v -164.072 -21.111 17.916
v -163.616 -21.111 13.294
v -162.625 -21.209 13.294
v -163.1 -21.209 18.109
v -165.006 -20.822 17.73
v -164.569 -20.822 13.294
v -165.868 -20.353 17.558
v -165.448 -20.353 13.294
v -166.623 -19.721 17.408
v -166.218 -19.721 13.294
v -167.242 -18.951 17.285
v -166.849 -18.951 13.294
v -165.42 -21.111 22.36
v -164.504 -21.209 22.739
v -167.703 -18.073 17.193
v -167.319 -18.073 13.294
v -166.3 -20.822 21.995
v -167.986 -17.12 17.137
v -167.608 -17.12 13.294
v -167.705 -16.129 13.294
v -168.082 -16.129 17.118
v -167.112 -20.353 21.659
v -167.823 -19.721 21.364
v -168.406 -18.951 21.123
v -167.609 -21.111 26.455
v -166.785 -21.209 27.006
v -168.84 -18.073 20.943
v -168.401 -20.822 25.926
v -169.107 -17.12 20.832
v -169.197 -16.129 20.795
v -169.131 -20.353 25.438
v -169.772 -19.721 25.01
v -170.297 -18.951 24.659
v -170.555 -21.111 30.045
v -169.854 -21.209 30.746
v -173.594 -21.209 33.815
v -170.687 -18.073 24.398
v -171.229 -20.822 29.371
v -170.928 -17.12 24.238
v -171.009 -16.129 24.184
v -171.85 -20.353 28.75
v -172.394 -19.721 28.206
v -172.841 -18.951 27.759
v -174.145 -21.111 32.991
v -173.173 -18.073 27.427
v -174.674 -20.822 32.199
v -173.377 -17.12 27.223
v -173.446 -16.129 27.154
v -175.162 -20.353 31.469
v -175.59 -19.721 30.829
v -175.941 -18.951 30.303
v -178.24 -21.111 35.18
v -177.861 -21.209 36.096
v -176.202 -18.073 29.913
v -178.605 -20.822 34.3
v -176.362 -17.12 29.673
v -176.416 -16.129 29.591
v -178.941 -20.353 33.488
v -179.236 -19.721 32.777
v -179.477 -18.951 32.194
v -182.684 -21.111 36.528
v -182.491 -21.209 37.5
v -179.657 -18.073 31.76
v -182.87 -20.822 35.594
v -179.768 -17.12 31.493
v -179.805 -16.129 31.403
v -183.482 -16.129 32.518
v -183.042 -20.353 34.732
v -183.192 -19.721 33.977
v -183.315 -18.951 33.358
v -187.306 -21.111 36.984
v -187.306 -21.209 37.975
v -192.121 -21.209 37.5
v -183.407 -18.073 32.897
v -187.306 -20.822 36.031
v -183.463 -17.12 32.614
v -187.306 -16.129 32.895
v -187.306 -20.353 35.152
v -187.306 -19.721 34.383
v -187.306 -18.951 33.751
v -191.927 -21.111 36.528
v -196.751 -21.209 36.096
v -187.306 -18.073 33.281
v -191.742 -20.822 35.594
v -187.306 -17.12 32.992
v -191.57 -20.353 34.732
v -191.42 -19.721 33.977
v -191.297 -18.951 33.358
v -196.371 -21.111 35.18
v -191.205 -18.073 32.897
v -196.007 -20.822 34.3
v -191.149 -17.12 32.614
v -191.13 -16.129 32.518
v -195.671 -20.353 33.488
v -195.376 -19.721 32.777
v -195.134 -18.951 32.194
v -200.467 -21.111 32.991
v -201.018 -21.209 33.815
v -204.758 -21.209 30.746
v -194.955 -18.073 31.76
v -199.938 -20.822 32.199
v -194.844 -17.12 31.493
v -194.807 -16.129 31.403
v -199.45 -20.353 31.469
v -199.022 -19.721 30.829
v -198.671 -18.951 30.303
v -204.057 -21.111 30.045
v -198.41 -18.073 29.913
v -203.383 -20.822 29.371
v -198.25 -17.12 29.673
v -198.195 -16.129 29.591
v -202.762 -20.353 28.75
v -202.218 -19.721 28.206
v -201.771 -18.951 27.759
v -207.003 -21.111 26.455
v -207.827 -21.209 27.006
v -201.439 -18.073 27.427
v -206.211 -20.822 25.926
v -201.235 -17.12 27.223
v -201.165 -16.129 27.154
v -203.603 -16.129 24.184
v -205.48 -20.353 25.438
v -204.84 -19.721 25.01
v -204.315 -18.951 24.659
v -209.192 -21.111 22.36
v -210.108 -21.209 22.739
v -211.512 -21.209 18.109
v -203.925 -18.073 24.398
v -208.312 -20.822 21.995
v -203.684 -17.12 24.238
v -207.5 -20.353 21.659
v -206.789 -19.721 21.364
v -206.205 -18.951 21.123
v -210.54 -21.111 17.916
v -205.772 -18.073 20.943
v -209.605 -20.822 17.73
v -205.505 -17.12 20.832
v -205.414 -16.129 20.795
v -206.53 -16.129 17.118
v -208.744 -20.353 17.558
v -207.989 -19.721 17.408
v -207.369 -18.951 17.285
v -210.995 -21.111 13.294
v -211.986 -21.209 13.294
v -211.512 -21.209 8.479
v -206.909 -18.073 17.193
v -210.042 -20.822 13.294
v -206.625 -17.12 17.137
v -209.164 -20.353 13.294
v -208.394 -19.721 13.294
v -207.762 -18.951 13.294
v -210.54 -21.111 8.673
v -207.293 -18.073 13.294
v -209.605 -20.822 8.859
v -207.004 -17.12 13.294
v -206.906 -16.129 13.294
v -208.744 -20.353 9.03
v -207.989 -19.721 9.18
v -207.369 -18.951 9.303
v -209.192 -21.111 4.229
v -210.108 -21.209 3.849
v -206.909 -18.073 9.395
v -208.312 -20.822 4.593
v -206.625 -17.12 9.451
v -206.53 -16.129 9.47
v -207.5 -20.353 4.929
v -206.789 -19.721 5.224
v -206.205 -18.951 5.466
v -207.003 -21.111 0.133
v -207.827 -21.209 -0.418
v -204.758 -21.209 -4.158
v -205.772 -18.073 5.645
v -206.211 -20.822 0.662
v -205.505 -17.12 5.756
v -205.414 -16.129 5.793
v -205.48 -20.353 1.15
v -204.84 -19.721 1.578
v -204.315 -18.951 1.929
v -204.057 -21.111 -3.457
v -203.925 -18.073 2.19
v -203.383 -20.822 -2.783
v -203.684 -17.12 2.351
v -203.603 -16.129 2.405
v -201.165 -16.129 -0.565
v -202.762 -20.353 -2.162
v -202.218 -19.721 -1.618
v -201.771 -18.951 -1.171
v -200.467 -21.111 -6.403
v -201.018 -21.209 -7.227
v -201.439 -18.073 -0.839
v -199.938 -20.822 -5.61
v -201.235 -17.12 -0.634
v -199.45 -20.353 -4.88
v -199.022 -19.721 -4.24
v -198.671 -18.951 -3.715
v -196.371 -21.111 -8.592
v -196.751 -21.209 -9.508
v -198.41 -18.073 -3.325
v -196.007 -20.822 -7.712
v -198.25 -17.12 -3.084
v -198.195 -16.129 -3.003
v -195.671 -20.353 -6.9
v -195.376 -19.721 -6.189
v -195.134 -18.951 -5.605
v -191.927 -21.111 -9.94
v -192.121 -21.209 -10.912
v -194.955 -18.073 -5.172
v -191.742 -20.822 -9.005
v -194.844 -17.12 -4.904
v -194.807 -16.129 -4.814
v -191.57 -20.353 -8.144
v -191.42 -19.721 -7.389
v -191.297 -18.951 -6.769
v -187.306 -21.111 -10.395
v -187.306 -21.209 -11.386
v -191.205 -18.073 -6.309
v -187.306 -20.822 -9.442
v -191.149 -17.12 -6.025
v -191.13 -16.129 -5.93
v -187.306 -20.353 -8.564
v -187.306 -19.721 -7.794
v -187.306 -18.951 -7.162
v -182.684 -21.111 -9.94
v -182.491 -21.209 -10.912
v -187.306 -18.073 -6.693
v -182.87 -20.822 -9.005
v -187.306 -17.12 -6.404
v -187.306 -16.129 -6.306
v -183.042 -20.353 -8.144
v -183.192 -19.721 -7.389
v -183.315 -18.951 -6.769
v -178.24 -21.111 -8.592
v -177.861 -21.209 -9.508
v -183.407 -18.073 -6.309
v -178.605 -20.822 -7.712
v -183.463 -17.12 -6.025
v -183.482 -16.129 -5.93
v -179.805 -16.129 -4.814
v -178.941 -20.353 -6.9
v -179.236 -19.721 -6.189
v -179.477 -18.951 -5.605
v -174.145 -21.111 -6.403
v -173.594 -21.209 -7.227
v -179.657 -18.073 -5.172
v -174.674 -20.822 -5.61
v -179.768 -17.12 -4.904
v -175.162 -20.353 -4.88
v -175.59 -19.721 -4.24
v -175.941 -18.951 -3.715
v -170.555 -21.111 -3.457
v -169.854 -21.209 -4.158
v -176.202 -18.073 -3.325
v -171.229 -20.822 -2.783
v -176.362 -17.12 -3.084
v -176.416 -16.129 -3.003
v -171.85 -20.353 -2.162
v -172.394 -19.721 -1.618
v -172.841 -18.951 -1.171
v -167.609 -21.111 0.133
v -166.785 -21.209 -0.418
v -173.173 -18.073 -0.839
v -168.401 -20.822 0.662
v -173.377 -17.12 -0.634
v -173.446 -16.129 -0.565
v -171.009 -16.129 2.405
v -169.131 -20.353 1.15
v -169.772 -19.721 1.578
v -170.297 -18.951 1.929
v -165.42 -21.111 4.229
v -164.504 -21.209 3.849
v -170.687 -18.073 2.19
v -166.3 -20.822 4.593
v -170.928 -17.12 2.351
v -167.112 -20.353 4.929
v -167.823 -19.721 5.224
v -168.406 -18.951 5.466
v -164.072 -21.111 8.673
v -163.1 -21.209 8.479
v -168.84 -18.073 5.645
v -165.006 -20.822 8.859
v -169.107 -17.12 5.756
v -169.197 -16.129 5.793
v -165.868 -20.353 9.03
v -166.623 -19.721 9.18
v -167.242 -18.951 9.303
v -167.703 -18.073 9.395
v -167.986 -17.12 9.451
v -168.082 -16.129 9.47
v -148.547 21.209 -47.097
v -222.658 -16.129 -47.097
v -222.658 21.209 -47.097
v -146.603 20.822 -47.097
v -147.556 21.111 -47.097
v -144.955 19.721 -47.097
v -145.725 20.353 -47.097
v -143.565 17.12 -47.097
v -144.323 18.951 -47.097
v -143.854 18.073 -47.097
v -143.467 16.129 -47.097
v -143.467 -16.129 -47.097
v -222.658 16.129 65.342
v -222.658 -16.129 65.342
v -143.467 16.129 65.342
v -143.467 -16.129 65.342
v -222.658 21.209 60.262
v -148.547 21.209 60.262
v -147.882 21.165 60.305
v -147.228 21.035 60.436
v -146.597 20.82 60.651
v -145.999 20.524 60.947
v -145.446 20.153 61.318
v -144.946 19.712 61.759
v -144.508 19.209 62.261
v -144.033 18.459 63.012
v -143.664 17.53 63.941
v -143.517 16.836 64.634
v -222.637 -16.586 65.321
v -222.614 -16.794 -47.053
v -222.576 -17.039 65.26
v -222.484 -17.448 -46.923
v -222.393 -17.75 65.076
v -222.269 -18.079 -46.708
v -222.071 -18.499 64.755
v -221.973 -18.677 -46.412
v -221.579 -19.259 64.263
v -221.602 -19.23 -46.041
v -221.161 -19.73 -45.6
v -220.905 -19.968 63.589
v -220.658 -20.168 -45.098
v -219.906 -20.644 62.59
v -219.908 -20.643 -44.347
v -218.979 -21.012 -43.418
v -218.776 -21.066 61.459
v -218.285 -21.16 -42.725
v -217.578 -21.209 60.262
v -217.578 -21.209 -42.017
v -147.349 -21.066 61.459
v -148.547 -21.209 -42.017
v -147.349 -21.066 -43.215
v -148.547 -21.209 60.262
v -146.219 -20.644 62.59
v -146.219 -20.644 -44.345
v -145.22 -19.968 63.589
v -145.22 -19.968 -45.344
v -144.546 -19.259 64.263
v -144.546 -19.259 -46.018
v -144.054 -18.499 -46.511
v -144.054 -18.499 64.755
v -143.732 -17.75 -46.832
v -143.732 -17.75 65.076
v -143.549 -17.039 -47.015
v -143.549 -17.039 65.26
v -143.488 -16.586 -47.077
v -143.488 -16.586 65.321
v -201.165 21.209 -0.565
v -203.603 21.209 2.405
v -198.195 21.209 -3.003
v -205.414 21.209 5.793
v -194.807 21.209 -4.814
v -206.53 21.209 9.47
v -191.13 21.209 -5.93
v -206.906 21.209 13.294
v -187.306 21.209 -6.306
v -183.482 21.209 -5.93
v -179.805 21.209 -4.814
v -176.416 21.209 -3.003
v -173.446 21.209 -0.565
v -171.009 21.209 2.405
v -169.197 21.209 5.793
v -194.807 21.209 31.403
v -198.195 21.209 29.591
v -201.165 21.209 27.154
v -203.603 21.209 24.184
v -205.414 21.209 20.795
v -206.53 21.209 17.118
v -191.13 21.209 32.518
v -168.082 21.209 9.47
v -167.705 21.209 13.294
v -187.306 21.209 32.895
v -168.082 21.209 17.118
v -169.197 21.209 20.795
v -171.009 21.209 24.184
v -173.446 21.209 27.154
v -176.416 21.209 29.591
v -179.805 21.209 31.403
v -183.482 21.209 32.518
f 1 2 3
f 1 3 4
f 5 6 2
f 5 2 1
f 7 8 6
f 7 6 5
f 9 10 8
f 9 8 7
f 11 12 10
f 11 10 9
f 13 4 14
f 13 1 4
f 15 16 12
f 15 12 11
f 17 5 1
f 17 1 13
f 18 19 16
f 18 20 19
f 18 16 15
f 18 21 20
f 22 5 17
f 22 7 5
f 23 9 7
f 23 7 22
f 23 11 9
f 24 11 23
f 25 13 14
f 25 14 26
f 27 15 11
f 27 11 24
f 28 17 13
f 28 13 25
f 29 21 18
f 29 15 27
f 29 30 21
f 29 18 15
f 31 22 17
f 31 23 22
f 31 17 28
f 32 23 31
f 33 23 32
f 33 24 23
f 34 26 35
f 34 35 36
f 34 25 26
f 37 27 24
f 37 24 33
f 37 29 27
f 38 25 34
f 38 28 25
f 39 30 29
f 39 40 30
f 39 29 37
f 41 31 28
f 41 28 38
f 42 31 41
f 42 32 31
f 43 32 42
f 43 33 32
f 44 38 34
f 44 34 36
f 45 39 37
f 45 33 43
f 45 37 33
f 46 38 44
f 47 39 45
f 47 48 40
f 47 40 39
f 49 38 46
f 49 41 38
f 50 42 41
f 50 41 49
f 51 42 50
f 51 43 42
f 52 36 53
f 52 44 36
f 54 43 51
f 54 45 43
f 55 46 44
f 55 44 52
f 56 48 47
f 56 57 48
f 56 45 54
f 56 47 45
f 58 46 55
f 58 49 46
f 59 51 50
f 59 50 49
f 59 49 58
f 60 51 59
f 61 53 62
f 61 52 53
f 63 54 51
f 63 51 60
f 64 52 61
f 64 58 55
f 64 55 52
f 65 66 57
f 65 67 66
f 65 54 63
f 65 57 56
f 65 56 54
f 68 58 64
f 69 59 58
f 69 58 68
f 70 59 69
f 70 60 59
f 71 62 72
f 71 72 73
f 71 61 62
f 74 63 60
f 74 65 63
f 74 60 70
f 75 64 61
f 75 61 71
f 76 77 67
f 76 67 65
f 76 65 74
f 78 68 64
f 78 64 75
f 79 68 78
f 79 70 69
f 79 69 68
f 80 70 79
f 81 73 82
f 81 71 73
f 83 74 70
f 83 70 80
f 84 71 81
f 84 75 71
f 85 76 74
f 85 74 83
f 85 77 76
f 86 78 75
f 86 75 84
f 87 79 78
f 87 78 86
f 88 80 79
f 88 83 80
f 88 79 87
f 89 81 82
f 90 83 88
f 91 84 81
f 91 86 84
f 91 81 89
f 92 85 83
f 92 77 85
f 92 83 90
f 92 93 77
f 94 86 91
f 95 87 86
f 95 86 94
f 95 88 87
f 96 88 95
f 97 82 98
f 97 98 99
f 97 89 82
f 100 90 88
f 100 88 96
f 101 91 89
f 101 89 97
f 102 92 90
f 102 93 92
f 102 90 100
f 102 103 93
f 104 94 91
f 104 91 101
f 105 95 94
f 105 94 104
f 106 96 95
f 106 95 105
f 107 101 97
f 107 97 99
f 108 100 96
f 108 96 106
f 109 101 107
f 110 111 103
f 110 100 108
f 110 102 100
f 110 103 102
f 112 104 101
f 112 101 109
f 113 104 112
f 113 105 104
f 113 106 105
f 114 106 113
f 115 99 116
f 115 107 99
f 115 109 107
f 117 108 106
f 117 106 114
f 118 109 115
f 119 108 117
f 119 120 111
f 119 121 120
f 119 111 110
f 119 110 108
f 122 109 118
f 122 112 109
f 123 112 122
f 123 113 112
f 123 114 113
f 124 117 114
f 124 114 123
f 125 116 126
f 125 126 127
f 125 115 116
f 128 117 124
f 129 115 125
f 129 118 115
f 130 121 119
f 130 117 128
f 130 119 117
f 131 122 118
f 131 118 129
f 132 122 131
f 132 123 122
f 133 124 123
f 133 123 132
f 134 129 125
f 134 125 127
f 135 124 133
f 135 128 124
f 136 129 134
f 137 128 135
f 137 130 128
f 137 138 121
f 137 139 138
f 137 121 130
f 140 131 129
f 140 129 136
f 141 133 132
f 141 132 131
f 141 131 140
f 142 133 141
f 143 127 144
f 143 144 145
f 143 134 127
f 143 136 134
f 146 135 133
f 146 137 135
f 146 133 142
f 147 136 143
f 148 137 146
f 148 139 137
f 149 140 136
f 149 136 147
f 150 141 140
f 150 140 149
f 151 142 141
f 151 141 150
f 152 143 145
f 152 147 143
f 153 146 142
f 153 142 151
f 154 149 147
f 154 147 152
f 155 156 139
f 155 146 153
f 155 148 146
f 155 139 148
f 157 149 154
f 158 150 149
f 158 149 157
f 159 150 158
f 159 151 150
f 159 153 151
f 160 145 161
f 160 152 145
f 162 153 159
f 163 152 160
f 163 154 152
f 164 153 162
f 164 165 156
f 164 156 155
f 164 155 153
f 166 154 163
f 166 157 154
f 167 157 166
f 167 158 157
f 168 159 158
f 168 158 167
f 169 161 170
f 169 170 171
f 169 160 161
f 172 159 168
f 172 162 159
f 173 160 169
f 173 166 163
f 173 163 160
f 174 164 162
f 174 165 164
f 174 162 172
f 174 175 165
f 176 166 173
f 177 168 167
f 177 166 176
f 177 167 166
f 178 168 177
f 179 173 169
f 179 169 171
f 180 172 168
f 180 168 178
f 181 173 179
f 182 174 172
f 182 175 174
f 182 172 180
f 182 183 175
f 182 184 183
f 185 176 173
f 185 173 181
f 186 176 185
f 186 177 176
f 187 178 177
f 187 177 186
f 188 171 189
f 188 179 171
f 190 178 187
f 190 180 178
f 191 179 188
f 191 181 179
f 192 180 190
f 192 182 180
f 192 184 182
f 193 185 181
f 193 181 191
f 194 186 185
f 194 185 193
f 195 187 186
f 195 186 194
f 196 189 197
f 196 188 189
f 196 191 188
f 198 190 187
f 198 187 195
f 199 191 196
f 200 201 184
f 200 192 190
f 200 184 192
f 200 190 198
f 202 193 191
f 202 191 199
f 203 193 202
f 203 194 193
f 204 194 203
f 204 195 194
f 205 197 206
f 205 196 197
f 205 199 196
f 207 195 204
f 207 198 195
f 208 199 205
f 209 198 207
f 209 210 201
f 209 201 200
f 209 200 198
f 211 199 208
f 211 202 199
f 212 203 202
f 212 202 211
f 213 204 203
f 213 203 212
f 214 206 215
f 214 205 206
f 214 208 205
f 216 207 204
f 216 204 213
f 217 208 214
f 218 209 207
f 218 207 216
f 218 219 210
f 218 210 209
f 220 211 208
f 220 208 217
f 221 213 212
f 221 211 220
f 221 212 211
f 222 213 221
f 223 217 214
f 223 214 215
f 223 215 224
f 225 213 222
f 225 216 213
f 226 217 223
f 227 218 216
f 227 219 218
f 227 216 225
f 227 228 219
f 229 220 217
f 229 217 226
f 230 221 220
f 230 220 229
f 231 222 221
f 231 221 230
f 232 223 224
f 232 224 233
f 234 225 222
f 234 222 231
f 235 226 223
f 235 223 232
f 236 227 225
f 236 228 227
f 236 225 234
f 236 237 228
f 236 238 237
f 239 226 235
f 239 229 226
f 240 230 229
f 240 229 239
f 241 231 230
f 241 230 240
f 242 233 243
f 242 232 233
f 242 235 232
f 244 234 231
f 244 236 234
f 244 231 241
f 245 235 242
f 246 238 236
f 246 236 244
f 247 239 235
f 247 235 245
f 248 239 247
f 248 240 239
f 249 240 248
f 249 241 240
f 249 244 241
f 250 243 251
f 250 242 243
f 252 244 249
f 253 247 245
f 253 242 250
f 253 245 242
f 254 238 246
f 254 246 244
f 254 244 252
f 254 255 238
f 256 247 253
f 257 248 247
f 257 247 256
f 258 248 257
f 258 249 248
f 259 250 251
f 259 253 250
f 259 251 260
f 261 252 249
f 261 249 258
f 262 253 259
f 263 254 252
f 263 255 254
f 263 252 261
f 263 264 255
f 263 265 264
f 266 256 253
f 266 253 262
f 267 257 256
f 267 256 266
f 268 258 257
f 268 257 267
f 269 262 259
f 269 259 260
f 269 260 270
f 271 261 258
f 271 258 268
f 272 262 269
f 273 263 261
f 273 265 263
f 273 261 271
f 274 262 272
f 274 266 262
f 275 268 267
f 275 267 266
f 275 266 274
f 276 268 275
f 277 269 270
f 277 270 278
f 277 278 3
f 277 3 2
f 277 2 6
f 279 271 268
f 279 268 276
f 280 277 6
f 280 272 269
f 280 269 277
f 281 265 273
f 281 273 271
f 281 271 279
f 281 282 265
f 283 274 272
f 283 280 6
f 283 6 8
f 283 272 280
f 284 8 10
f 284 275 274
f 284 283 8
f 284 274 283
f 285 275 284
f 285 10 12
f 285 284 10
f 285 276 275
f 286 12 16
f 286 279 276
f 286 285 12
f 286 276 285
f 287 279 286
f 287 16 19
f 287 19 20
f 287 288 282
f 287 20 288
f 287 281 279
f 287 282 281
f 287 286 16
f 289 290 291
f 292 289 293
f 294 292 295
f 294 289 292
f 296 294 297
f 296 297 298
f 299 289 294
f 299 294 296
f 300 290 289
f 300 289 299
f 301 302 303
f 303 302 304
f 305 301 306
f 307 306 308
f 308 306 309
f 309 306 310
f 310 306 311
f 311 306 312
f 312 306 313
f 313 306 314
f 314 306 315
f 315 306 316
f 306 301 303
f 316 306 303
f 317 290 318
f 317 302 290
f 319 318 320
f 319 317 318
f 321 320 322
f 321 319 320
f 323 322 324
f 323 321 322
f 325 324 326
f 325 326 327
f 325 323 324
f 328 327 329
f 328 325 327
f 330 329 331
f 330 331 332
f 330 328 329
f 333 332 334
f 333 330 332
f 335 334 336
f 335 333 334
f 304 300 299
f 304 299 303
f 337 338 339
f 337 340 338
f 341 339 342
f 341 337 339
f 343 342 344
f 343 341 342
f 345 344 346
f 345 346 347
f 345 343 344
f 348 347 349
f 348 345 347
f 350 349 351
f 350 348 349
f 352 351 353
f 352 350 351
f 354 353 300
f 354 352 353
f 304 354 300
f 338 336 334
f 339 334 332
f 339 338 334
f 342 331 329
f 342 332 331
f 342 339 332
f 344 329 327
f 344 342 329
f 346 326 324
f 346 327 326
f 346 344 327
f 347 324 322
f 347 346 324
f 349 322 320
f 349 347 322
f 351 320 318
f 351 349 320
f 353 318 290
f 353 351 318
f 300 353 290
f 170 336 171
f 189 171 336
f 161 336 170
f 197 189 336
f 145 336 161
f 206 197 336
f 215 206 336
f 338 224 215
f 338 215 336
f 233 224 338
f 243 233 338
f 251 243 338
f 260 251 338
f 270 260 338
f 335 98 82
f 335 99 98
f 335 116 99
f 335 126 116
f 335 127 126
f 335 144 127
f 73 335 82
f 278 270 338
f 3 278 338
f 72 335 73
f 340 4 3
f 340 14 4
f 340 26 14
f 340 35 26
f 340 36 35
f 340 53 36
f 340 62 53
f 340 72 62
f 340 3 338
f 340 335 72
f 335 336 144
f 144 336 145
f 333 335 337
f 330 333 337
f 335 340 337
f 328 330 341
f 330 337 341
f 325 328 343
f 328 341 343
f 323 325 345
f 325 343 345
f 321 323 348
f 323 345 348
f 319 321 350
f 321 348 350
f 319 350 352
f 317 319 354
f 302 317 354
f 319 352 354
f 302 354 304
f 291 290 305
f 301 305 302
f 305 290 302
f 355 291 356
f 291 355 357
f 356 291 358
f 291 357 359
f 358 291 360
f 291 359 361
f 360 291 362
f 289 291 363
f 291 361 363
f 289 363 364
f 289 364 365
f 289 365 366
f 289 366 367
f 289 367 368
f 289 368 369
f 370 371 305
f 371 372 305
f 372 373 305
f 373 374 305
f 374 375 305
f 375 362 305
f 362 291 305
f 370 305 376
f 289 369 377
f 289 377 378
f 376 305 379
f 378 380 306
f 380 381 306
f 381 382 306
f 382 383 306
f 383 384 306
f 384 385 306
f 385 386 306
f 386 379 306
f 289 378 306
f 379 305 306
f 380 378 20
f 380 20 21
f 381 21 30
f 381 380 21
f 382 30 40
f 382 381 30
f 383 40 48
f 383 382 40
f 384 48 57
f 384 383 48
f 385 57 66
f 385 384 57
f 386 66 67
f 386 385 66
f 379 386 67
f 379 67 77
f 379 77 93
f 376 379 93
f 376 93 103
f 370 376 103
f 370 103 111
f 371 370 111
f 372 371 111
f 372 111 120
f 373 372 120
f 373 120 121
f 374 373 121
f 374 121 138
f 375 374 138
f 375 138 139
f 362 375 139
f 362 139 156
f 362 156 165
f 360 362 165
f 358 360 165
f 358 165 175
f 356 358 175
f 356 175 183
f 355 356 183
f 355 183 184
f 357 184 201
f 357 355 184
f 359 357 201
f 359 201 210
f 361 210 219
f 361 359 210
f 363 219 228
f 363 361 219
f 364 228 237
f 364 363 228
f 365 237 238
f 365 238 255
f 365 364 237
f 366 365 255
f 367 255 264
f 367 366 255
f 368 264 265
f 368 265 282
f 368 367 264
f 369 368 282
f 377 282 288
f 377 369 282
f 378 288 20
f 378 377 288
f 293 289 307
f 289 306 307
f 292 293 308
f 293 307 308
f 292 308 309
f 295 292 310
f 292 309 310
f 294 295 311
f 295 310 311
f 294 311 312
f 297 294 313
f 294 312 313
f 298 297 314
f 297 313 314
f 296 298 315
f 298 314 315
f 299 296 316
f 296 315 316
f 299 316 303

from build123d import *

# Parameters (mm, degrees)
F0_W     = 79.1909694672
F0_H     = 112.4388724566
F0_R     = 19.6004589853
F1_DEPTH = 21.209
F2_R     = 5.08
F3_SIZE  = 5.08
F4_R     = 5.08


# Not quite as in the source:
# - a feature names something its author has since deleted; it is built from what else it names


with BuildPart() as f1:
    # F0 (on Front) → F1 (new body, symmetric)
    with BuildSketch(Plane.XZ):
        with Locations((-183.0625087023, 9.1222152114)):
            Rectangle(F0_W, F0_H)
        with Locations((-187.305867672, 13.2941789925)):
            Circle(F0_R, mode=Mode.SUBTRACT)
    extrude(amount=F1_DEPTH, both=True)

    # F2
    f2_edges = [f1.edges().sort_by_distance(p)[0] for p in [
        (-183.062509, -21.209, 65.341651),
        (-222.657993, -21.209, 9.122215),
        (-183.062509, -21.209, -47.097221),
        (-143.467024, -21.209, 9.122215),
        (-206.906327, -21.209, 13.294179),
    ]]
    fillet(f2_edges, radius=F2_R)

    # F3
    f3_edges = [f1.edges().sort_by_distance(p)[0] for p in [
        (-183.062509, 21.209, 65.341651),
    ]]
    chamfer(f3_edges, length=F3_SIZE)

    # F4
    f4_edges = [f1.edges().sort_by_distance(p)[0] for p in [
        (-143.467024, 21.209, 6.582215),
    ]]
    fillet(f4_edges, radius=F4_R)


solid = f1.part
